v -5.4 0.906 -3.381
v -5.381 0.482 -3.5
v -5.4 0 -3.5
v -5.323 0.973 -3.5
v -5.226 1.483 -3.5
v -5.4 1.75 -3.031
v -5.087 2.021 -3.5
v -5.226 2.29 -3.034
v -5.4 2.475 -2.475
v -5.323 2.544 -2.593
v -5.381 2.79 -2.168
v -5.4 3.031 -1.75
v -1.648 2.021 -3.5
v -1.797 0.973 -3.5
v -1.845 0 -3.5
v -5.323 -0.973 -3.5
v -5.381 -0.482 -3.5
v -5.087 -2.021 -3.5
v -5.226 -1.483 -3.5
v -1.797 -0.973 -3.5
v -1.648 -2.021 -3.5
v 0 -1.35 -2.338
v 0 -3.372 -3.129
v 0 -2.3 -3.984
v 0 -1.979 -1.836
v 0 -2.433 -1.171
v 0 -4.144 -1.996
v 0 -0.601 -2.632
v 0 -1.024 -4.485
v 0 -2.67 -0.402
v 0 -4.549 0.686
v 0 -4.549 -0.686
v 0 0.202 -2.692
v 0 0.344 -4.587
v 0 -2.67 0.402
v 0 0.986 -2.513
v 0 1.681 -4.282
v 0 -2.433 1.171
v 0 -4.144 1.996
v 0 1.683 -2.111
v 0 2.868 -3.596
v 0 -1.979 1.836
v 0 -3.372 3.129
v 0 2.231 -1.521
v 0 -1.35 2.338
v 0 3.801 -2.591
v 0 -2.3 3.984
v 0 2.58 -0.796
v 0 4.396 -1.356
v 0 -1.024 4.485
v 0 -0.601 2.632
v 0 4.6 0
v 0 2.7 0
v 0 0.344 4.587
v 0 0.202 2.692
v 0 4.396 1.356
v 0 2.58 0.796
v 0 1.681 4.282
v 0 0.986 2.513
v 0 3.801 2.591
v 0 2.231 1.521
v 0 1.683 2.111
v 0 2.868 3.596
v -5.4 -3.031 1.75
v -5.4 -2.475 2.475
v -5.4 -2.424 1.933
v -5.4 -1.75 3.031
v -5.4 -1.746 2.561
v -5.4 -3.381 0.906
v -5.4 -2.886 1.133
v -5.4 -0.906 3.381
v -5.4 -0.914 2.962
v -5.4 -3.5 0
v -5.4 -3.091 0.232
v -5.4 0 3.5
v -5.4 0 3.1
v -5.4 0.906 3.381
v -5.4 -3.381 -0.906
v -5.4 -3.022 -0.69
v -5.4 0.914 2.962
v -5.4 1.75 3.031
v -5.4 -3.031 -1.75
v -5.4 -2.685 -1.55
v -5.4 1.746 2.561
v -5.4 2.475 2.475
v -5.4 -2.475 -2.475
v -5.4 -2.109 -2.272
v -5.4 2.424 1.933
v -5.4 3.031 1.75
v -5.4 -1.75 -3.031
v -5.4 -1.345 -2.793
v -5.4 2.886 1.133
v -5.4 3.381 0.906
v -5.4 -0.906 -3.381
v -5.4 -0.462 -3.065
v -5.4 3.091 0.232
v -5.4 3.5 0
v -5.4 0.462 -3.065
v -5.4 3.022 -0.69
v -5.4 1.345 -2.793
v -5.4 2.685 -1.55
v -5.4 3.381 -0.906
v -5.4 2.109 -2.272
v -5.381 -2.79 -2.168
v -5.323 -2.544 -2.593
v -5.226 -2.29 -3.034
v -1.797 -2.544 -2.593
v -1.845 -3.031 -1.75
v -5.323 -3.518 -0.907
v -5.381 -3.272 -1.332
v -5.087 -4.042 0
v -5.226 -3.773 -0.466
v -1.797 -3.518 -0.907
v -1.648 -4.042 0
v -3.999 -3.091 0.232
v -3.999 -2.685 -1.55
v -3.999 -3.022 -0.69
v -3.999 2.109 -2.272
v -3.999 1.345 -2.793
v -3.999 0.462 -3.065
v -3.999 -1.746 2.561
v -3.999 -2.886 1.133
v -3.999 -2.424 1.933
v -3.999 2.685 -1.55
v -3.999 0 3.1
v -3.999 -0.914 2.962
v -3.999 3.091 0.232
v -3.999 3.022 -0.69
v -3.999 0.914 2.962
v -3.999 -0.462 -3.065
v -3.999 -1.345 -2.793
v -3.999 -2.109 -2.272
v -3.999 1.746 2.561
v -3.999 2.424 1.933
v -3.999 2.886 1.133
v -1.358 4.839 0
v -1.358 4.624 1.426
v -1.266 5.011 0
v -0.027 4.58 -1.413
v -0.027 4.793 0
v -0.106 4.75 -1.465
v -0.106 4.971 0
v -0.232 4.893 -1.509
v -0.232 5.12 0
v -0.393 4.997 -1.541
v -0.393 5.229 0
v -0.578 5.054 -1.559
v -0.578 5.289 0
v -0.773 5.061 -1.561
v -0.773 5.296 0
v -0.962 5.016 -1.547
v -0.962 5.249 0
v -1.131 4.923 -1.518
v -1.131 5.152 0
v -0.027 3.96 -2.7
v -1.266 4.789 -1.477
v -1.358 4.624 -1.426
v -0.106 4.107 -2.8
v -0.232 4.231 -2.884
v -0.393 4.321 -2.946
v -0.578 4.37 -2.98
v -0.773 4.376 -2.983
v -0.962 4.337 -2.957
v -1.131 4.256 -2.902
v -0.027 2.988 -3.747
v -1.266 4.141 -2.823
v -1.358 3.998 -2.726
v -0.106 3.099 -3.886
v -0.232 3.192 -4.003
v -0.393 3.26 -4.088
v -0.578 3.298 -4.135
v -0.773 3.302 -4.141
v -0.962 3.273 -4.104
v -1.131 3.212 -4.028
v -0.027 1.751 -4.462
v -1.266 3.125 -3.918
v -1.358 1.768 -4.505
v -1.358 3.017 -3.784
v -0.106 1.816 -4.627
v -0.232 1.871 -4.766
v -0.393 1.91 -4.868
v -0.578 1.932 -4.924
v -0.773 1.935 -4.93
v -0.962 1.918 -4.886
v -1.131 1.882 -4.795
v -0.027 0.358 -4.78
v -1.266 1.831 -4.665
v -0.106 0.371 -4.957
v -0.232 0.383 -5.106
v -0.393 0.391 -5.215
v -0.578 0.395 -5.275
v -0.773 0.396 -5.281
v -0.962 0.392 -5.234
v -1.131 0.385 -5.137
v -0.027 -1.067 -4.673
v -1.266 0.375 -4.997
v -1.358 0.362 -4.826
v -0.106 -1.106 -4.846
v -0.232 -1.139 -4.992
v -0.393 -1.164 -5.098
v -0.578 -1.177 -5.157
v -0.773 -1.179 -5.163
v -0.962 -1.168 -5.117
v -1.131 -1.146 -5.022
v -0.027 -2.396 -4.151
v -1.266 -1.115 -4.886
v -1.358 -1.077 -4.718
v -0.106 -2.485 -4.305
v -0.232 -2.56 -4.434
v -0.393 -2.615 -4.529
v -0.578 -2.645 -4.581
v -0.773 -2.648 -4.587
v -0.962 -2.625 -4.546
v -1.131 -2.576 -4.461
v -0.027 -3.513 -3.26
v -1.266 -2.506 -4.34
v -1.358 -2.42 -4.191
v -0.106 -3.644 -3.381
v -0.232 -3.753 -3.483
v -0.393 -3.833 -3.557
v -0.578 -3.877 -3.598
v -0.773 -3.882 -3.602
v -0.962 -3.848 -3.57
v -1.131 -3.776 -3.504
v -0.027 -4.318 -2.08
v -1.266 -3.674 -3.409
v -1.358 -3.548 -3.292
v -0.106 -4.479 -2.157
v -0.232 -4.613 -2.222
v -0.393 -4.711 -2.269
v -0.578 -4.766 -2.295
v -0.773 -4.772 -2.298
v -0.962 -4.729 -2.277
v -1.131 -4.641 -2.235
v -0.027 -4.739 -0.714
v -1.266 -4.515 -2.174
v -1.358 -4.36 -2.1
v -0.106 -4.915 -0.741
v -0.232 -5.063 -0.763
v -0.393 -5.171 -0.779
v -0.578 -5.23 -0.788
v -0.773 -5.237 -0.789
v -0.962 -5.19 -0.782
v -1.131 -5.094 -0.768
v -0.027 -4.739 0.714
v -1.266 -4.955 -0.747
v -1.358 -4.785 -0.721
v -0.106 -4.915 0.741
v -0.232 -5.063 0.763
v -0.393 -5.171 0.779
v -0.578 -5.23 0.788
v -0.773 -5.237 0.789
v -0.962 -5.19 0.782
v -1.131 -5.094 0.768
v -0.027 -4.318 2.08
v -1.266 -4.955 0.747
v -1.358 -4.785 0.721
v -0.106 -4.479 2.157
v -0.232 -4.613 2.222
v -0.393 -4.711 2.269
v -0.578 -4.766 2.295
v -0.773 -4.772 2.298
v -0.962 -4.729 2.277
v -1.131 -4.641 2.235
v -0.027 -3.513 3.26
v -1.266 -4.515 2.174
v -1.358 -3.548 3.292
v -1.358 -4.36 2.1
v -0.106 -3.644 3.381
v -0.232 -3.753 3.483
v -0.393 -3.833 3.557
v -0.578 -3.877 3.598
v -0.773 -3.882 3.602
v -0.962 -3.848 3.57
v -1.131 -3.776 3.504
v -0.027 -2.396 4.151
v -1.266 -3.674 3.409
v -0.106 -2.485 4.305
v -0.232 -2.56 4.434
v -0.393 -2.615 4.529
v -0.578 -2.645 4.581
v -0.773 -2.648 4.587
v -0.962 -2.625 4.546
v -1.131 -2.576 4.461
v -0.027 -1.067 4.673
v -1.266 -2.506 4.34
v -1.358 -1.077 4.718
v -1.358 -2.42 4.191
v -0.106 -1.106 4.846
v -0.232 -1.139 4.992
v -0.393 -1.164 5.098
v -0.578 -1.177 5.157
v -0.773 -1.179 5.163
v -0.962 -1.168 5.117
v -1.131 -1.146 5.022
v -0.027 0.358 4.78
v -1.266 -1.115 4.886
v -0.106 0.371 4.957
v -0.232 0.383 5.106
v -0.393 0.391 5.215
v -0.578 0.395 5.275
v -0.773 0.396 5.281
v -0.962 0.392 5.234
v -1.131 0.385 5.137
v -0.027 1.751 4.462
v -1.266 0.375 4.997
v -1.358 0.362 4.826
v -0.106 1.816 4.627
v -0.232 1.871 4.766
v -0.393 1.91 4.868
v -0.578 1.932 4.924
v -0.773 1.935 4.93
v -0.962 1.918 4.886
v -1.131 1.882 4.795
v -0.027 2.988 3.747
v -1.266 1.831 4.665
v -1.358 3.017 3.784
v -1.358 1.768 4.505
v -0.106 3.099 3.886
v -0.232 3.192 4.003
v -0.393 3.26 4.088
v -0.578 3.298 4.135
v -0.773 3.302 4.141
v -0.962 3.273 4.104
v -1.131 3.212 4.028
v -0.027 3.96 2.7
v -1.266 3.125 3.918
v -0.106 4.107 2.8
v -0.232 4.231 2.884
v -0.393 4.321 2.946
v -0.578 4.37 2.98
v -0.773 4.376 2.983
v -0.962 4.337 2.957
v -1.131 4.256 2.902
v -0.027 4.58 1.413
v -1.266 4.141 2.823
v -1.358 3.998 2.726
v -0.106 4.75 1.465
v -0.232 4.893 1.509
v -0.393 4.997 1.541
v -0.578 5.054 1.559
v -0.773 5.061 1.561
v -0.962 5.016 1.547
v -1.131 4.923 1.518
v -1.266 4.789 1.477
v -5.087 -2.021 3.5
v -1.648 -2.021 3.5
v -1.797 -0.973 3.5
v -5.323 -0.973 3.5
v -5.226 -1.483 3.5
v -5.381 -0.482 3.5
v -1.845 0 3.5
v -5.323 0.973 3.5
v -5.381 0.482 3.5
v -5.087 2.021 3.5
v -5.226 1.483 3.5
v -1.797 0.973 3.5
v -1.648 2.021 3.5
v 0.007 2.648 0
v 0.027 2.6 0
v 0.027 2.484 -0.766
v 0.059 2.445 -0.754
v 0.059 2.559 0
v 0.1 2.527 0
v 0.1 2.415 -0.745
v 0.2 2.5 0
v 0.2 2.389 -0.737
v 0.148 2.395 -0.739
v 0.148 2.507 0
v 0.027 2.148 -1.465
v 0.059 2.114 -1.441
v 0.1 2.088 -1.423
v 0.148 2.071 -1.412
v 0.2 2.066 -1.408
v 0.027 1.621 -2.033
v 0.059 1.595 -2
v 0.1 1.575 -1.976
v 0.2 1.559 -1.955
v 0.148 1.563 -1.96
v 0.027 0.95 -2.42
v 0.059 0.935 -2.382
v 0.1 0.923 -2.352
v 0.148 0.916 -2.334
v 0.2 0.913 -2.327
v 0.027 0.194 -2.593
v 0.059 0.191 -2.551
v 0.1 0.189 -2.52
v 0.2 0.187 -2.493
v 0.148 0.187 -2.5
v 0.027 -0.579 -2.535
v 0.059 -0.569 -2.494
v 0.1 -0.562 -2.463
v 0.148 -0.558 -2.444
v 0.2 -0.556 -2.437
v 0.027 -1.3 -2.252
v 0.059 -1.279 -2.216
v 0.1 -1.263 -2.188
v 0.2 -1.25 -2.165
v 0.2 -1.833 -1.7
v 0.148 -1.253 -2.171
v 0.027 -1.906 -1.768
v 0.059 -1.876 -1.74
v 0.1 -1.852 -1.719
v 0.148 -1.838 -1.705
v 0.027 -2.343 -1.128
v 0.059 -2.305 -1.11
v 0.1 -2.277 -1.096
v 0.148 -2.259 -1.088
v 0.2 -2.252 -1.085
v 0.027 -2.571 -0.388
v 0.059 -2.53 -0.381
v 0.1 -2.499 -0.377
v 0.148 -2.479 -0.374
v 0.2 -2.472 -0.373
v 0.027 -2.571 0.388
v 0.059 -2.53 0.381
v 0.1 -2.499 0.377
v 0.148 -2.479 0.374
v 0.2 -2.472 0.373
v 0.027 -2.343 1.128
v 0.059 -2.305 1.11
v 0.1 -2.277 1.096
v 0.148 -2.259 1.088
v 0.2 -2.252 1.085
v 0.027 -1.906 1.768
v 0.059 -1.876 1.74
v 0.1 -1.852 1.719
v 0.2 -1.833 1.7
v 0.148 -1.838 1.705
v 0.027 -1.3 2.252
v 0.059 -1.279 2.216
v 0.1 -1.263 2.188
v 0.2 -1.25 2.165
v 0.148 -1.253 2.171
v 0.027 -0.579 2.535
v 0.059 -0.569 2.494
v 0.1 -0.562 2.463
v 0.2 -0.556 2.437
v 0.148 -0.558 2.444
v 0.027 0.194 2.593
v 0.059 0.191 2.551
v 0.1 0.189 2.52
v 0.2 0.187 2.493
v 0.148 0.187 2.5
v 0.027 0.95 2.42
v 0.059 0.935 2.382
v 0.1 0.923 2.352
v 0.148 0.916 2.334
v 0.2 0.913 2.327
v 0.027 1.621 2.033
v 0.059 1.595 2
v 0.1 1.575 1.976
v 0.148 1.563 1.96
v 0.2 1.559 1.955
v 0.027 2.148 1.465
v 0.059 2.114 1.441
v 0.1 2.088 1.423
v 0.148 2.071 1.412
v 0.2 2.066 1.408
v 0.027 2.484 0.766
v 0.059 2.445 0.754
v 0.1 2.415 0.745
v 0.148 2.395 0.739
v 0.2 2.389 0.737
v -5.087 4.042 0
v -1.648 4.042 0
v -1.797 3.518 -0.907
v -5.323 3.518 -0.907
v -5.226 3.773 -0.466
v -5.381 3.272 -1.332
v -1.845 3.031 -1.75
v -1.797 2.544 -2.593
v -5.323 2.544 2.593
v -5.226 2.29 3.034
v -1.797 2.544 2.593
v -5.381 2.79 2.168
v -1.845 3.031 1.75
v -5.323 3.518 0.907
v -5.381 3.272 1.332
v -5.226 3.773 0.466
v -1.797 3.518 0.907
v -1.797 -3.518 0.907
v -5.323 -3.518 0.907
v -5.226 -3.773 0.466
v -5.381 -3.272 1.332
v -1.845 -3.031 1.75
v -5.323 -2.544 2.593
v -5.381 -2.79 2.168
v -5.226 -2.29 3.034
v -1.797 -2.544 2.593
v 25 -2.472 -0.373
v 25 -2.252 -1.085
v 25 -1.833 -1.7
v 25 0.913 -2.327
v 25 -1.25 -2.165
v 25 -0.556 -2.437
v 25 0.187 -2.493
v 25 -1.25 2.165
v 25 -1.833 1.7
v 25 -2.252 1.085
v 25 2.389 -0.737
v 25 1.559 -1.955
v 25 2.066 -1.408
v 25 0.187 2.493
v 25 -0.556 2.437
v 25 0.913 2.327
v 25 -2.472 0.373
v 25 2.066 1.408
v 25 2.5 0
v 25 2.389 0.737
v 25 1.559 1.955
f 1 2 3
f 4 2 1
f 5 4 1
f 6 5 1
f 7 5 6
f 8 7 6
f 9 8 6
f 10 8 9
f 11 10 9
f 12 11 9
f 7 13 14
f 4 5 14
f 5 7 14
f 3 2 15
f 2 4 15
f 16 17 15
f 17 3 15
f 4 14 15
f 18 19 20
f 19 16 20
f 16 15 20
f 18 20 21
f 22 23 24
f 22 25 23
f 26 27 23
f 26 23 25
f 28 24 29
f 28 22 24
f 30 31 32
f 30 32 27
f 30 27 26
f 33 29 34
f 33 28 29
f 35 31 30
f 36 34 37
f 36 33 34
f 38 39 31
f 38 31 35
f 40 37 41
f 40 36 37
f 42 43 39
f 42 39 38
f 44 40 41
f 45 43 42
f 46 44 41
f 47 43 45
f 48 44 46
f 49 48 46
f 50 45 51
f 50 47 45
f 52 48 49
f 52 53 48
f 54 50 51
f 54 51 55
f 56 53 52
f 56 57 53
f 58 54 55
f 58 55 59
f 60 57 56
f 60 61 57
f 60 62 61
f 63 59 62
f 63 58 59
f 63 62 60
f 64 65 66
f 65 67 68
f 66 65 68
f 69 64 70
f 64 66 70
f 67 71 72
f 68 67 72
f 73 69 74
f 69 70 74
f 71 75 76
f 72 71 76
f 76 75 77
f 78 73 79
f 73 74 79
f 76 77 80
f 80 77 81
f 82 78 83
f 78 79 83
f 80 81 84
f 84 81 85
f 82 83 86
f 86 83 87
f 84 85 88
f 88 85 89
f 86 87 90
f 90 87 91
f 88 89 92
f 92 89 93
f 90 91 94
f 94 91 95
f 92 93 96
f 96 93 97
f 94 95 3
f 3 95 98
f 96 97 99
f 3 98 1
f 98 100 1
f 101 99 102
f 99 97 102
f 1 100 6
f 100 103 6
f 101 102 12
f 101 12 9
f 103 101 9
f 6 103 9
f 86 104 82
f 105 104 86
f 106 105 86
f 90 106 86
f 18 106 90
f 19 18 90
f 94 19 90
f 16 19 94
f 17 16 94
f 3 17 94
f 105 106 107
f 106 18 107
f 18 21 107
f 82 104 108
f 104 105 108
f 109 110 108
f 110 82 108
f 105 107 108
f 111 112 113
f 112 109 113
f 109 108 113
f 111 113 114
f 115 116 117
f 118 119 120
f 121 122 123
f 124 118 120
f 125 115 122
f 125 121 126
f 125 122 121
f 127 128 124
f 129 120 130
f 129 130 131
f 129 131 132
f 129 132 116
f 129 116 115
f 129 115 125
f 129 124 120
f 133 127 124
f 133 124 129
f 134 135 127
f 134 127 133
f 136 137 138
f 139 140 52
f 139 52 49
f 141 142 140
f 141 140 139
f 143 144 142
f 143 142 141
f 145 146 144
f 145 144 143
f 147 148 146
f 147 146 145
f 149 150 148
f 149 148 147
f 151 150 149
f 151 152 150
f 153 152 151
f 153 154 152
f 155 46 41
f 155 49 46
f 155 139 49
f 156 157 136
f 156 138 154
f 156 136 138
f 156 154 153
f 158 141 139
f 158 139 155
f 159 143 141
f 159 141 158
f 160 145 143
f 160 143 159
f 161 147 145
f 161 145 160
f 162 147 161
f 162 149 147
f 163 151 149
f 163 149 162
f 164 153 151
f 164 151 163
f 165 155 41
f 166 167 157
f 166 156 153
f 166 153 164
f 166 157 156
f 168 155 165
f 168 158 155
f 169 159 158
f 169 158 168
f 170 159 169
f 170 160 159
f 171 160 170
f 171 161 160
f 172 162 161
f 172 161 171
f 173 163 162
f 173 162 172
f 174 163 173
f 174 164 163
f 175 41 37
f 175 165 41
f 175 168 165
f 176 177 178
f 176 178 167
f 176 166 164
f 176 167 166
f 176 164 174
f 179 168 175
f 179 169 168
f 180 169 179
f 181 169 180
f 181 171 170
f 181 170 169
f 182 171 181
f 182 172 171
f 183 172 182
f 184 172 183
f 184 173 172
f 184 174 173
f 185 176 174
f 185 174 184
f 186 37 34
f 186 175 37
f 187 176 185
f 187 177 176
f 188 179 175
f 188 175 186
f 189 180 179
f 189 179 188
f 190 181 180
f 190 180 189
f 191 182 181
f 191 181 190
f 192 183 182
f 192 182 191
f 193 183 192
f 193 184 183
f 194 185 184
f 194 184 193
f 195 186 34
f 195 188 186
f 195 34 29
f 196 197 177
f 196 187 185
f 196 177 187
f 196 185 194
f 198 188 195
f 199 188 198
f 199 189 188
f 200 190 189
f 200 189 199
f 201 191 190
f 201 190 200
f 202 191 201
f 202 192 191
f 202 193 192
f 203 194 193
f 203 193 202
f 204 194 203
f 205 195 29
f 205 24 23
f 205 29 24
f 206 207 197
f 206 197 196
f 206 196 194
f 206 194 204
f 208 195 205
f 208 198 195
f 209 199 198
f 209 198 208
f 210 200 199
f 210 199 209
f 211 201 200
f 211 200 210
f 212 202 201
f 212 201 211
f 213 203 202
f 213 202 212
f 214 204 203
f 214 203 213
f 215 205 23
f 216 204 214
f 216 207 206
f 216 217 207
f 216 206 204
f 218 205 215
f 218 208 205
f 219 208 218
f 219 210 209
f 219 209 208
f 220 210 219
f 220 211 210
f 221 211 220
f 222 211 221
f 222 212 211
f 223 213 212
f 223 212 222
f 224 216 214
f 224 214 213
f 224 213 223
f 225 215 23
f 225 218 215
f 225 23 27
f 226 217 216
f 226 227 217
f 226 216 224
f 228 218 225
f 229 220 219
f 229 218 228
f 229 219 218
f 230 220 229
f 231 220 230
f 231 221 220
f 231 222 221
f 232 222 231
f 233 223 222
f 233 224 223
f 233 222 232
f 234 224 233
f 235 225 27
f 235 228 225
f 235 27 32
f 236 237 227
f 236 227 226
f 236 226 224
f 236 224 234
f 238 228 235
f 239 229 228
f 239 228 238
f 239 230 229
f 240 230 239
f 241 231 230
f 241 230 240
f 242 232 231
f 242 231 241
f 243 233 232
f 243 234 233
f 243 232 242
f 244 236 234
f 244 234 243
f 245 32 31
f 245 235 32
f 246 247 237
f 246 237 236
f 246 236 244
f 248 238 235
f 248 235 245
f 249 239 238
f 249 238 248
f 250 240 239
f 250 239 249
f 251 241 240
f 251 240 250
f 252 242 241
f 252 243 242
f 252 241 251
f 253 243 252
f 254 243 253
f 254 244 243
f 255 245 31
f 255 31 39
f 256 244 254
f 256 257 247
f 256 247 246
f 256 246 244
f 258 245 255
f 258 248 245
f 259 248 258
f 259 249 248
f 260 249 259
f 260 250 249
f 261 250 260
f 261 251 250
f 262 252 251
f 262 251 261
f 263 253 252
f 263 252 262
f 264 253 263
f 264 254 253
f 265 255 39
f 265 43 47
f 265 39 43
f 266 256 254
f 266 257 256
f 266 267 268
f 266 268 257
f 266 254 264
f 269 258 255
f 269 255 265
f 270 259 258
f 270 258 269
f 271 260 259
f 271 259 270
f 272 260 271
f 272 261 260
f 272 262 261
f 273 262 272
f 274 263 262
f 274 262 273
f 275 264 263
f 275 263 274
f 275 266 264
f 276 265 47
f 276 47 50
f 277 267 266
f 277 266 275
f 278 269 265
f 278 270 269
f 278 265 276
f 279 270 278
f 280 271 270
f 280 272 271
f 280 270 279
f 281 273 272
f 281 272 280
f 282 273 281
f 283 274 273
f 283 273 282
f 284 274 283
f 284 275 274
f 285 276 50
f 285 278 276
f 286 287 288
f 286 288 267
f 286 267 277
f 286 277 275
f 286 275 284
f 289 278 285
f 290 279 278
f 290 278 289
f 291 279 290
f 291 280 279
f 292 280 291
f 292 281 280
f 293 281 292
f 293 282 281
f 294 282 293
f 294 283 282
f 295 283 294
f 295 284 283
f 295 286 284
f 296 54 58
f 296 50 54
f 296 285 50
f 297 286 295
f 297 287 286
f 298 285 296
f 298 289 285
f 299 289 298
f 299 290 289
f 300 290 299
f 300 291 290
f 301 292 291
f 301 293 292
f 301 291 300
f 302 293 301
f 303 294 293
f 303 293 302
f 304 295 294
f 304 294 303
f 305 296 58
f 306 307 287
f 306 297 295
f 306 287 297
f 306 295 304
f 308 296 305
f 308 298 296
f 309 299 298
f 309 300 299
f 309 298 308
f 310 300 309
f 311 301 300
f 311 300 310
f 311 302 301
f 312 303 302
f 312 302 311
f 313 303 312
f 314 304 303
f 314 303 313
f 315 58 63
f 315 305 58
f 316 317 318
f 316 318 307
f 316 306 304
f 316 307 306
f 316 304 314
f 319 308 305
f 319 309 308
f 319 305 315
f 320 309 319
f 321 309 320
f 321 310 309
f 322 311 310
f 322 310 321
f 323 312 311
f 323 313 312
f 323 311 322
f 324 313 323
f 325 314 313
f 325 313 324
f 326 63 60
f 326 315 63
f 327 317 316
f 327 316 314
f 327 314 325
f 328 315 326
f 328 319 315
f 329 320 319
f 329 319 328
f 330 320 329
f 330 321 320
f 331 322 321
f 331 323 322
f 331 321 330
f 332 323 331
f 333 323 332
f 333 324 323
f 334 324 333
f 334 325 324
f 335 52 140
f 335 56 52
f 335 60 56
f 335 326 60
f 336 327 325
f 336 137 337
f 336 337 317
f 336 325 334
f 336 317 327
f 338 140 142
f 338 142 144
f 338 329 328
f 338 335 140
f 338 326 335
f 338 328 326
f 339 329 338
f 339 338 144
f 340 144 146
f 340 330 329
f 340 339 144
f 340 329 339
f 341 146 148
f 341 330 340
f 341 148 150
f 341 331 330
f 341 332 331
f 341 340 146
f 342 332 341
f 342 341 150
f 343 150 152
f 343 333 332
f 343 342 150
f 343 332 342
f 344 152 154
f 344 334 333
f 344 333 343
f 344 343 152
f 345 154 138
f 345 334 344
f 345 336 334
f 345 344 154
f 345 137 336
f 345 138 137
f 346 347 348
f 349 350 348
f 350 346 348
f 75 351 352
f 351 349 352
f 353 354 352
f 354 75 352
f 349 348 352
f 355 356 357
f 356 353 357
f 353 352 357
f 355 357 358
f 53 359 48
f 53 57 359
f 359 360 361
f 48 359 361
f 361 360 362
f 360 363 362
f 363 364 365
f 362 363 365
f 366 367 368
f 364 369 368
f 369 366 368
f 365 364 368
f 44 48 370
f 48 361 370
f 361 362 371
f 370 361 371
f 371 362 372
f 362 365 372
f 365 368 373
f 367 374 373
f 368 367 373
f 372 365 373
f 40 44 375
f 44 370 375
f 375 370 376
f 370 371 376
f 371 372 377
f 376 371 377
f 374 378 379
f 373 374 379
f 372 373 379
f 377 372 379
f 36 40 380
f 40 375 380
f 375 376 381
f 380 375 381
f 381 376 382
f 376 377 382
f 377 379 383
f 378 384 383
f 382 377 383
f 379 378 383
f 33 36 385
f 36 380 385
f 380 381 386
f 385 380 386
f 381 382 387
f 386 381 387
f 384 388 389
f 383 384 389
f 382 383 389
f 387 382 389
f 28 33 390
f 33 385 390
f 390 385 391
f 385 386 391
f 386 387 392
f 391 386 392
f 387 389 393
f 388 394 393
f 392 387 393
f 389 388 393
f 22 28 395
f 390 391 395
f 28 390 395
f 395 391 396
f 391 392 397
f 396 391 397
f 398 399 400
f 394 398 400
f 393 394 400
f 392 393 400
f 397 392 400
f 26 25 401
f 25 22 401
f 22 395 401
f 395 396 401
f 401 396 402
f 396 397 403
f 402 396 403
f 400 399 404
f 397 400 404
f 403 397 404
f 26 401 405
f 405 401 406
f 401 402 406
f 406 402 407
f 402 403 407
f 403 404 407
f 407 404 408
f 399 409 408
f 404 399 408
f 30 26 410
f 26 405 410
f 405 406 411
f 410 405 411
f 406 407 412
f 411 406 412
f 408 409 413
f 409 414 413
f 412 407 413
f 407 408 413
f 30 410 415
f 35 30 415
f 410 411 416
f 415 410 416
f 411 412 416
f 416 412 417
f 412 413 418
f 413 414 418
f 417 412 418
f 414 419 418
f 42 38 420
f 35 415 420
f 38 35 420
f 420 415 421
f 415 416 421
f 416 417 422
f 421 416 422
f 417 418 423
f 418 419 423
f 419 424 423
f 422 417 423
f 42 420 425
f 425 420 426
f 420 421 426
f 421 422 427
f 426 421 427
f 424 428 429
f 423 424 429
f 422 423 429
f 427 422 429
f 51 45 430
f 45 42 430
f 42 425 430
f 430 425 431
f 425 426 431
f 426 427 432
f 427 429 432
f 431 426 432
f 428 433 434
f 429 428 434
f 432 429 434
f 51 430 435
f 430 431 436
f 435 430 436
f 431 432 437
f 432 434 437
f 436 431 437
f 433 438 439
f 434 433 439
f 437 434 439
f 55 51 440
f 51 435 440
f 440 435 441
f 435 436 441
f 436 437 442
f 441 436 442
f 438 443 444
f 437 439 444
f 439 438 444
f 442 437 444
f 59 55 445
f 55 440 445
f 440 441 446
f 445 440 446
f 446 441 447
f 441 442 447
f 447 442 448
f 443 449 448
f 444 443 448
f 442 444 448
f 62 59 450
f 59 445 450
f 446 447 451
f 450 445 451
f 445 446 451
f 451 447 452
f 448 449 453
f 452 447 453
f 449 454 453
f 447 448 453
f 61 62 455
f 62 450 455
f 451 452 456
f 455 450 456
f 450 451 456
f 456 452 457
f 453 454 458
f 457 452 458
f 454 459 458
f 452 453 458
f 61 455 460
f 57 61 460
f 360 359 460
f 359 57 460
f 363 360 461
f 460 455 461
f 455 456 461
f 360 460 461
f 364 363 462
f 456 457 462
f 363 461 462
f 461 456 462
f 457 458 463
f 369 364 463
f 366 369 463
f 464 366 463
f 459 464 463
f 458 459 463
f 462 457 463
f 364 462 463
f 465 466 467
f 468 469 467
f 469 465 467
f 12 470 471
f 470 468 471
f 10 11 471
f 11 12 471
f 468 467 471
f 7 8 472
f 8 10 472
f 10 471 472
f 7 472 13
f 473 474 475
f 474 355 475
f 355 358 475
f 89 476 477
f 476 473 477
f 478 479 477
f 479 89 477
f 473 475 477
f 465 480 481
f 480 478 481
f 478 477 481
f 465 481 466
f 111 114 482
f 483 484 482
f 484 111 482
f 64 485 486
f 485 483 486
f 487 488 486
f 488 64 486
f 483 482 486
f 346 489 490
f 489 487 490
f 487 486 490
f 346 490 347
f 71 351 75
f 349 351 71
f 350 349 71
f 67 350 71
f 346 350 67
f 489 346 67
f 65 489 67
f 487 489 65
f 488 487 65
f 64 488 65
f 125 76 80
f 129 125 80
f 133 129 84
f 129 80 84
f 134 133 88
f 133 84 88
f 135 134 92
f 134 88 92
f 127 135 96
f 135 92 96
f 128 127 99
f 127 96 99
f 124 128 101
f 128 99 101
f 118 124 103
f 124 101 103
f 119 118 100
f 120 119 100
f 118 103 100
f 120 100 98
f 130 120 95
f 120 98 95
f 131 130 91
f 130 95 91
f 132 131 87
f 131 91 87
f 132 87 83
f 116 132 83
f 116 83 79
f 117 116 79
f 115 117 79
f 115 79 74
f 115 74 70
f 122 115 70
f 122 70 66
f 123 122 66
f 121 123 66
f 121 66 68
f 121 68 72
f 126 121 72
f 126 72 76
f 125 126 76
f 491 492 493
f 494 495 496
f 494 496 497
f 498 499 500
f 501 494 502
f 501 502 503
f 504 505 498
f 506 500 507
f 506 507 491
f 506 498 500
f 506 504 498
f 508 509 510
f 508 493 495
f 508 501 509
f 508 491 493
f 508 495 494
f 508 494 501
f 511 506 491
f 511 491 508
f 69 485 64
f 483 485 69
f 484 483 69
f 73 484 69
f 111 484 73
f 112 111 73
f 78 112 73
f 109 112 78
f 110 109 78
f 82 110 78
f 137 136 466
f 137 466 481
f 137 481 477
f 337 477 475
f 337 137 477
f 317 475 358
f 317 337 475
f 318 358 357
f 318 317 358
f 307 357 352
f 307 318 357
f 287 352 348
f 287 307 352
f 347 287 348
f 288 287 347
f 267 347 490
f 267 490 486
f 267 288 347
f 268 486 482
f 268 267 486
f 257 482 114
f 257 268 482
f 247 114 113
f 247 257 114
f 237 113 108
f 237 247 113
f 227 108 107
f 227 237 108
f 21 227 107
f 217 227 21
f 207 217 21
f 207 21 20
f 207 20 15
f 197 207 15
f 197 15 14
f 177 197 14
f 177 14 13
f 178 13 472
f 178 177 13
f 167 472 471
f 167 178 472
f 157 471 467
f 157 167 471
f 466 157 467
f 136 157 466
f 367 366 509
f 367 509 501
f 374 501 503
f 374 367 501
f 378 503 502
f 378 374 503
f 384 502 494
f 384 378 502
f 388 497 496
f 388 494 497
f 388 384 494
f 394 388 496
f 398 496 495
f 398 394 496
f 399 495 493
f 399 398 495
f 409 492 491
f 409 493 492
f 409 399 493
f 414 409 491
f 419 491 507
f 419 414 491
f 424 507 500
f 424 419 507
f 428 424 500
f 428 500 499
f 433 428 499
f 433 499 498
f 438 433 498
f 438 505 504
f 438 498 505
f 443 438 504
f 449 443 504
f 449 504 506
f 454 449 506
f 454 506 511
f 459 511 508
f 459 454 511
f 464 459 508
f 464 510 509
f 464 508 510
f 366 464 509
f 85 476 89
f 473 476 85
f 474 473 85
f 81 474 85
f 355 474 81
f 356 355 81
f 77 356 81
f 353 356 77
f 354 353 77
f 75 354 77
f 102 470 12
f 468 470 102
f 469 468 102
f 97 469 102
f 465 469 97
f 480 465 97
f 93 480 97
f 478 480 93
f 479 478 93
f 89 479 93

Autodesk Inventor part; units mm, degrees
ref_plane "YZ Plane" through (0, 0, 0) normal (1, 0, 0) x (0, 1, 0)
sketch "Sketch1" plane through (0, 0, 0) normal (0, 0, 1) x (1, 0, 0)
  line L0 (-1.3578, 4.8394) -> (-2.7, 1.1517)
  line L1 (-2.7, 1.1517) -> (-2.7, 0)
  line L2 (-2.7, 0) -> (25, 0)
  line L3 (25, 0) -> (25, 2.5)
  line L4 (25, 2.5) -> (0, 2.5)
  line L5 (0, 2.5) -> (0, 4.6)
  arc A0 (0, 4.6) -> (-1.3578, 4.8394) centre (-0.7, 4.6) ccw
  line L6 (-8.24, 0) -> (30.54, 0) projected
  line L7 (0, -1.0818) -> (0, 6.4909) projected
  dimension "d0" = 0.7
  dimension "d1" = 2.7
  dimension "d3" = 5
  dimension "d6" = 25
  dimension "d7" = 20
  dimension "d8" = 10.6
revolve "Body" add sketch "Sketch1" angle 360 about axis through (-2.7, 0, 0) along (1, 0, 0)
thread "Thread" size "M5x0.8" class "6g" standard "ISO Metric profile" length 23.2
sketch "Sketch2" plane through (0, 0, 0) normal (1, 0, 0) x (0, 0, -1)
  circle A0 centre (0, 0) radius 4.6 projected
  line L0 (0, 4.0415) -> (3.5, 2.0207)
  line L1 (3.5, 2.0207) -> (3.5, -2.0207)
  line L2 (3.5, -2.0207) -> (0, -4.0415)
  line L3 (0, -4.0415) -> (-3.5, -2.0207)
  line L4 (-3.5, -2.0207) -> (-3.5, 2.0207)
  line L5 (-3.5, 2.0207) -> (0, 4.0415)
  dimension "d14" = 7
extrude "Head" add sketch "Sketch2" against normal blind 5.4 contours L0 L1 L2 L3 L4 L5
fillet "Fillet1" radius 0.2 1 edges at (0, -2.5, 0)
ref_plane "IDS_WORKPLANE{1}" through (-5.4001, 0, 0) normal (-1, 0, 0) x (0, 0, 1)
sketch "Sketch3" plane through (-5.4001, 0, 0) normal (-1, 0, 0) x (0, 0, 1)
  circle A0 centre (0, 0) radius 3.1
  point P0 (0, 0)
  dimension "d18" = 6.2
extrude "Indent" cut sketch "Sketch3" against normal blind 1.401
sketch "Sketch4" plane through (0, 0, 0) normal (0, 0, 1) x (1, 0, 0)
  line L0 (-5.4, 3.5) -> (-5.4, 4.0415)
  line L1 (-5.4, 4.0415) -> (-5.0874, 4.0415)
  line L2 (-5.0874, 4.0415) -> (-5.4, 3.5)
  line L3 (-1.6482, 4.0415) -> (-5.4, 4.0415) projected
  line L4 (-5.4, 4.0415) -> (-5.4, 2.0207) projected
  line L5 (-6.1504, 0) -> (-0.8979, 0) projected
  dimension "d21" = 30
  dimension "d22" = 7
revolve "Chamfer1" cut sketch "Sketch4" angle 360 about axis through (-10, 0, 0) along (1, 0, 0)
ref_plane "Work Plane3" through (1.25, 0, 0) normal (0, 0, 1) x (1, 0, 0)
equation "\"d0\" = PHH"
equation "\"d1\" = 0.5 * KOH"
equation "\"d3\" = GD"
equation "\"d6\" = NLG"
equation "\"d7\" = KEWI"
equation "\"d8\" = LADI"
equation "\"d14\" = SW"
equation "\"d15\" = KOH"
equation "\"d18\" = KOD2"
equation "\"d21\" = ANG1"
equation "\"d22\" = SW"
equation "\"d9\" = GEL"
equation "\"d11\" = RR"
equation "\"NLG\" = 25"
equation "\"GD\" = NND"
equation "\"KOH\" = 5.4"
equation "\"GEL\" = 23.2"
equation "\"LADI\" = 10.6"
equation "\"SW\" = 7"
equation "\"PHH\" = 0.7"
equation "\"ANG1\" = 30deg"
equation "\"KEWI\" = 20deg"
equation "\"RR\" = 0.2"
equation "\"KOD2\" = 6.2"
equation "\"KOH2\" = 1.4"
equation "\"GUL\" = 0.61345 * PTC"
equation "\"SPD\" = 3.6"
equation "\"SD\" = 0"
equation "\"GD1\" = THREADDIA - 1.2269 * PTC"
equation "\"THREADDIA\" = 5"
equation "\"TOA\" = 30deg"
equation "\"BDM\" = NND"
equation "\"PTC\" = 0.8"
equation "\"NND\" = 5"
equation "\"BDM2\" = 4.36"
equation "\"GAL\" = 0.61345 * PTC"
equation "\"E0\" = 1.155 * SW"
properties part number "ANSI B 18.6.7 M / IFI 513 - M5x0,8 x 25, IHFHMSM" material "Steel, Mild"
